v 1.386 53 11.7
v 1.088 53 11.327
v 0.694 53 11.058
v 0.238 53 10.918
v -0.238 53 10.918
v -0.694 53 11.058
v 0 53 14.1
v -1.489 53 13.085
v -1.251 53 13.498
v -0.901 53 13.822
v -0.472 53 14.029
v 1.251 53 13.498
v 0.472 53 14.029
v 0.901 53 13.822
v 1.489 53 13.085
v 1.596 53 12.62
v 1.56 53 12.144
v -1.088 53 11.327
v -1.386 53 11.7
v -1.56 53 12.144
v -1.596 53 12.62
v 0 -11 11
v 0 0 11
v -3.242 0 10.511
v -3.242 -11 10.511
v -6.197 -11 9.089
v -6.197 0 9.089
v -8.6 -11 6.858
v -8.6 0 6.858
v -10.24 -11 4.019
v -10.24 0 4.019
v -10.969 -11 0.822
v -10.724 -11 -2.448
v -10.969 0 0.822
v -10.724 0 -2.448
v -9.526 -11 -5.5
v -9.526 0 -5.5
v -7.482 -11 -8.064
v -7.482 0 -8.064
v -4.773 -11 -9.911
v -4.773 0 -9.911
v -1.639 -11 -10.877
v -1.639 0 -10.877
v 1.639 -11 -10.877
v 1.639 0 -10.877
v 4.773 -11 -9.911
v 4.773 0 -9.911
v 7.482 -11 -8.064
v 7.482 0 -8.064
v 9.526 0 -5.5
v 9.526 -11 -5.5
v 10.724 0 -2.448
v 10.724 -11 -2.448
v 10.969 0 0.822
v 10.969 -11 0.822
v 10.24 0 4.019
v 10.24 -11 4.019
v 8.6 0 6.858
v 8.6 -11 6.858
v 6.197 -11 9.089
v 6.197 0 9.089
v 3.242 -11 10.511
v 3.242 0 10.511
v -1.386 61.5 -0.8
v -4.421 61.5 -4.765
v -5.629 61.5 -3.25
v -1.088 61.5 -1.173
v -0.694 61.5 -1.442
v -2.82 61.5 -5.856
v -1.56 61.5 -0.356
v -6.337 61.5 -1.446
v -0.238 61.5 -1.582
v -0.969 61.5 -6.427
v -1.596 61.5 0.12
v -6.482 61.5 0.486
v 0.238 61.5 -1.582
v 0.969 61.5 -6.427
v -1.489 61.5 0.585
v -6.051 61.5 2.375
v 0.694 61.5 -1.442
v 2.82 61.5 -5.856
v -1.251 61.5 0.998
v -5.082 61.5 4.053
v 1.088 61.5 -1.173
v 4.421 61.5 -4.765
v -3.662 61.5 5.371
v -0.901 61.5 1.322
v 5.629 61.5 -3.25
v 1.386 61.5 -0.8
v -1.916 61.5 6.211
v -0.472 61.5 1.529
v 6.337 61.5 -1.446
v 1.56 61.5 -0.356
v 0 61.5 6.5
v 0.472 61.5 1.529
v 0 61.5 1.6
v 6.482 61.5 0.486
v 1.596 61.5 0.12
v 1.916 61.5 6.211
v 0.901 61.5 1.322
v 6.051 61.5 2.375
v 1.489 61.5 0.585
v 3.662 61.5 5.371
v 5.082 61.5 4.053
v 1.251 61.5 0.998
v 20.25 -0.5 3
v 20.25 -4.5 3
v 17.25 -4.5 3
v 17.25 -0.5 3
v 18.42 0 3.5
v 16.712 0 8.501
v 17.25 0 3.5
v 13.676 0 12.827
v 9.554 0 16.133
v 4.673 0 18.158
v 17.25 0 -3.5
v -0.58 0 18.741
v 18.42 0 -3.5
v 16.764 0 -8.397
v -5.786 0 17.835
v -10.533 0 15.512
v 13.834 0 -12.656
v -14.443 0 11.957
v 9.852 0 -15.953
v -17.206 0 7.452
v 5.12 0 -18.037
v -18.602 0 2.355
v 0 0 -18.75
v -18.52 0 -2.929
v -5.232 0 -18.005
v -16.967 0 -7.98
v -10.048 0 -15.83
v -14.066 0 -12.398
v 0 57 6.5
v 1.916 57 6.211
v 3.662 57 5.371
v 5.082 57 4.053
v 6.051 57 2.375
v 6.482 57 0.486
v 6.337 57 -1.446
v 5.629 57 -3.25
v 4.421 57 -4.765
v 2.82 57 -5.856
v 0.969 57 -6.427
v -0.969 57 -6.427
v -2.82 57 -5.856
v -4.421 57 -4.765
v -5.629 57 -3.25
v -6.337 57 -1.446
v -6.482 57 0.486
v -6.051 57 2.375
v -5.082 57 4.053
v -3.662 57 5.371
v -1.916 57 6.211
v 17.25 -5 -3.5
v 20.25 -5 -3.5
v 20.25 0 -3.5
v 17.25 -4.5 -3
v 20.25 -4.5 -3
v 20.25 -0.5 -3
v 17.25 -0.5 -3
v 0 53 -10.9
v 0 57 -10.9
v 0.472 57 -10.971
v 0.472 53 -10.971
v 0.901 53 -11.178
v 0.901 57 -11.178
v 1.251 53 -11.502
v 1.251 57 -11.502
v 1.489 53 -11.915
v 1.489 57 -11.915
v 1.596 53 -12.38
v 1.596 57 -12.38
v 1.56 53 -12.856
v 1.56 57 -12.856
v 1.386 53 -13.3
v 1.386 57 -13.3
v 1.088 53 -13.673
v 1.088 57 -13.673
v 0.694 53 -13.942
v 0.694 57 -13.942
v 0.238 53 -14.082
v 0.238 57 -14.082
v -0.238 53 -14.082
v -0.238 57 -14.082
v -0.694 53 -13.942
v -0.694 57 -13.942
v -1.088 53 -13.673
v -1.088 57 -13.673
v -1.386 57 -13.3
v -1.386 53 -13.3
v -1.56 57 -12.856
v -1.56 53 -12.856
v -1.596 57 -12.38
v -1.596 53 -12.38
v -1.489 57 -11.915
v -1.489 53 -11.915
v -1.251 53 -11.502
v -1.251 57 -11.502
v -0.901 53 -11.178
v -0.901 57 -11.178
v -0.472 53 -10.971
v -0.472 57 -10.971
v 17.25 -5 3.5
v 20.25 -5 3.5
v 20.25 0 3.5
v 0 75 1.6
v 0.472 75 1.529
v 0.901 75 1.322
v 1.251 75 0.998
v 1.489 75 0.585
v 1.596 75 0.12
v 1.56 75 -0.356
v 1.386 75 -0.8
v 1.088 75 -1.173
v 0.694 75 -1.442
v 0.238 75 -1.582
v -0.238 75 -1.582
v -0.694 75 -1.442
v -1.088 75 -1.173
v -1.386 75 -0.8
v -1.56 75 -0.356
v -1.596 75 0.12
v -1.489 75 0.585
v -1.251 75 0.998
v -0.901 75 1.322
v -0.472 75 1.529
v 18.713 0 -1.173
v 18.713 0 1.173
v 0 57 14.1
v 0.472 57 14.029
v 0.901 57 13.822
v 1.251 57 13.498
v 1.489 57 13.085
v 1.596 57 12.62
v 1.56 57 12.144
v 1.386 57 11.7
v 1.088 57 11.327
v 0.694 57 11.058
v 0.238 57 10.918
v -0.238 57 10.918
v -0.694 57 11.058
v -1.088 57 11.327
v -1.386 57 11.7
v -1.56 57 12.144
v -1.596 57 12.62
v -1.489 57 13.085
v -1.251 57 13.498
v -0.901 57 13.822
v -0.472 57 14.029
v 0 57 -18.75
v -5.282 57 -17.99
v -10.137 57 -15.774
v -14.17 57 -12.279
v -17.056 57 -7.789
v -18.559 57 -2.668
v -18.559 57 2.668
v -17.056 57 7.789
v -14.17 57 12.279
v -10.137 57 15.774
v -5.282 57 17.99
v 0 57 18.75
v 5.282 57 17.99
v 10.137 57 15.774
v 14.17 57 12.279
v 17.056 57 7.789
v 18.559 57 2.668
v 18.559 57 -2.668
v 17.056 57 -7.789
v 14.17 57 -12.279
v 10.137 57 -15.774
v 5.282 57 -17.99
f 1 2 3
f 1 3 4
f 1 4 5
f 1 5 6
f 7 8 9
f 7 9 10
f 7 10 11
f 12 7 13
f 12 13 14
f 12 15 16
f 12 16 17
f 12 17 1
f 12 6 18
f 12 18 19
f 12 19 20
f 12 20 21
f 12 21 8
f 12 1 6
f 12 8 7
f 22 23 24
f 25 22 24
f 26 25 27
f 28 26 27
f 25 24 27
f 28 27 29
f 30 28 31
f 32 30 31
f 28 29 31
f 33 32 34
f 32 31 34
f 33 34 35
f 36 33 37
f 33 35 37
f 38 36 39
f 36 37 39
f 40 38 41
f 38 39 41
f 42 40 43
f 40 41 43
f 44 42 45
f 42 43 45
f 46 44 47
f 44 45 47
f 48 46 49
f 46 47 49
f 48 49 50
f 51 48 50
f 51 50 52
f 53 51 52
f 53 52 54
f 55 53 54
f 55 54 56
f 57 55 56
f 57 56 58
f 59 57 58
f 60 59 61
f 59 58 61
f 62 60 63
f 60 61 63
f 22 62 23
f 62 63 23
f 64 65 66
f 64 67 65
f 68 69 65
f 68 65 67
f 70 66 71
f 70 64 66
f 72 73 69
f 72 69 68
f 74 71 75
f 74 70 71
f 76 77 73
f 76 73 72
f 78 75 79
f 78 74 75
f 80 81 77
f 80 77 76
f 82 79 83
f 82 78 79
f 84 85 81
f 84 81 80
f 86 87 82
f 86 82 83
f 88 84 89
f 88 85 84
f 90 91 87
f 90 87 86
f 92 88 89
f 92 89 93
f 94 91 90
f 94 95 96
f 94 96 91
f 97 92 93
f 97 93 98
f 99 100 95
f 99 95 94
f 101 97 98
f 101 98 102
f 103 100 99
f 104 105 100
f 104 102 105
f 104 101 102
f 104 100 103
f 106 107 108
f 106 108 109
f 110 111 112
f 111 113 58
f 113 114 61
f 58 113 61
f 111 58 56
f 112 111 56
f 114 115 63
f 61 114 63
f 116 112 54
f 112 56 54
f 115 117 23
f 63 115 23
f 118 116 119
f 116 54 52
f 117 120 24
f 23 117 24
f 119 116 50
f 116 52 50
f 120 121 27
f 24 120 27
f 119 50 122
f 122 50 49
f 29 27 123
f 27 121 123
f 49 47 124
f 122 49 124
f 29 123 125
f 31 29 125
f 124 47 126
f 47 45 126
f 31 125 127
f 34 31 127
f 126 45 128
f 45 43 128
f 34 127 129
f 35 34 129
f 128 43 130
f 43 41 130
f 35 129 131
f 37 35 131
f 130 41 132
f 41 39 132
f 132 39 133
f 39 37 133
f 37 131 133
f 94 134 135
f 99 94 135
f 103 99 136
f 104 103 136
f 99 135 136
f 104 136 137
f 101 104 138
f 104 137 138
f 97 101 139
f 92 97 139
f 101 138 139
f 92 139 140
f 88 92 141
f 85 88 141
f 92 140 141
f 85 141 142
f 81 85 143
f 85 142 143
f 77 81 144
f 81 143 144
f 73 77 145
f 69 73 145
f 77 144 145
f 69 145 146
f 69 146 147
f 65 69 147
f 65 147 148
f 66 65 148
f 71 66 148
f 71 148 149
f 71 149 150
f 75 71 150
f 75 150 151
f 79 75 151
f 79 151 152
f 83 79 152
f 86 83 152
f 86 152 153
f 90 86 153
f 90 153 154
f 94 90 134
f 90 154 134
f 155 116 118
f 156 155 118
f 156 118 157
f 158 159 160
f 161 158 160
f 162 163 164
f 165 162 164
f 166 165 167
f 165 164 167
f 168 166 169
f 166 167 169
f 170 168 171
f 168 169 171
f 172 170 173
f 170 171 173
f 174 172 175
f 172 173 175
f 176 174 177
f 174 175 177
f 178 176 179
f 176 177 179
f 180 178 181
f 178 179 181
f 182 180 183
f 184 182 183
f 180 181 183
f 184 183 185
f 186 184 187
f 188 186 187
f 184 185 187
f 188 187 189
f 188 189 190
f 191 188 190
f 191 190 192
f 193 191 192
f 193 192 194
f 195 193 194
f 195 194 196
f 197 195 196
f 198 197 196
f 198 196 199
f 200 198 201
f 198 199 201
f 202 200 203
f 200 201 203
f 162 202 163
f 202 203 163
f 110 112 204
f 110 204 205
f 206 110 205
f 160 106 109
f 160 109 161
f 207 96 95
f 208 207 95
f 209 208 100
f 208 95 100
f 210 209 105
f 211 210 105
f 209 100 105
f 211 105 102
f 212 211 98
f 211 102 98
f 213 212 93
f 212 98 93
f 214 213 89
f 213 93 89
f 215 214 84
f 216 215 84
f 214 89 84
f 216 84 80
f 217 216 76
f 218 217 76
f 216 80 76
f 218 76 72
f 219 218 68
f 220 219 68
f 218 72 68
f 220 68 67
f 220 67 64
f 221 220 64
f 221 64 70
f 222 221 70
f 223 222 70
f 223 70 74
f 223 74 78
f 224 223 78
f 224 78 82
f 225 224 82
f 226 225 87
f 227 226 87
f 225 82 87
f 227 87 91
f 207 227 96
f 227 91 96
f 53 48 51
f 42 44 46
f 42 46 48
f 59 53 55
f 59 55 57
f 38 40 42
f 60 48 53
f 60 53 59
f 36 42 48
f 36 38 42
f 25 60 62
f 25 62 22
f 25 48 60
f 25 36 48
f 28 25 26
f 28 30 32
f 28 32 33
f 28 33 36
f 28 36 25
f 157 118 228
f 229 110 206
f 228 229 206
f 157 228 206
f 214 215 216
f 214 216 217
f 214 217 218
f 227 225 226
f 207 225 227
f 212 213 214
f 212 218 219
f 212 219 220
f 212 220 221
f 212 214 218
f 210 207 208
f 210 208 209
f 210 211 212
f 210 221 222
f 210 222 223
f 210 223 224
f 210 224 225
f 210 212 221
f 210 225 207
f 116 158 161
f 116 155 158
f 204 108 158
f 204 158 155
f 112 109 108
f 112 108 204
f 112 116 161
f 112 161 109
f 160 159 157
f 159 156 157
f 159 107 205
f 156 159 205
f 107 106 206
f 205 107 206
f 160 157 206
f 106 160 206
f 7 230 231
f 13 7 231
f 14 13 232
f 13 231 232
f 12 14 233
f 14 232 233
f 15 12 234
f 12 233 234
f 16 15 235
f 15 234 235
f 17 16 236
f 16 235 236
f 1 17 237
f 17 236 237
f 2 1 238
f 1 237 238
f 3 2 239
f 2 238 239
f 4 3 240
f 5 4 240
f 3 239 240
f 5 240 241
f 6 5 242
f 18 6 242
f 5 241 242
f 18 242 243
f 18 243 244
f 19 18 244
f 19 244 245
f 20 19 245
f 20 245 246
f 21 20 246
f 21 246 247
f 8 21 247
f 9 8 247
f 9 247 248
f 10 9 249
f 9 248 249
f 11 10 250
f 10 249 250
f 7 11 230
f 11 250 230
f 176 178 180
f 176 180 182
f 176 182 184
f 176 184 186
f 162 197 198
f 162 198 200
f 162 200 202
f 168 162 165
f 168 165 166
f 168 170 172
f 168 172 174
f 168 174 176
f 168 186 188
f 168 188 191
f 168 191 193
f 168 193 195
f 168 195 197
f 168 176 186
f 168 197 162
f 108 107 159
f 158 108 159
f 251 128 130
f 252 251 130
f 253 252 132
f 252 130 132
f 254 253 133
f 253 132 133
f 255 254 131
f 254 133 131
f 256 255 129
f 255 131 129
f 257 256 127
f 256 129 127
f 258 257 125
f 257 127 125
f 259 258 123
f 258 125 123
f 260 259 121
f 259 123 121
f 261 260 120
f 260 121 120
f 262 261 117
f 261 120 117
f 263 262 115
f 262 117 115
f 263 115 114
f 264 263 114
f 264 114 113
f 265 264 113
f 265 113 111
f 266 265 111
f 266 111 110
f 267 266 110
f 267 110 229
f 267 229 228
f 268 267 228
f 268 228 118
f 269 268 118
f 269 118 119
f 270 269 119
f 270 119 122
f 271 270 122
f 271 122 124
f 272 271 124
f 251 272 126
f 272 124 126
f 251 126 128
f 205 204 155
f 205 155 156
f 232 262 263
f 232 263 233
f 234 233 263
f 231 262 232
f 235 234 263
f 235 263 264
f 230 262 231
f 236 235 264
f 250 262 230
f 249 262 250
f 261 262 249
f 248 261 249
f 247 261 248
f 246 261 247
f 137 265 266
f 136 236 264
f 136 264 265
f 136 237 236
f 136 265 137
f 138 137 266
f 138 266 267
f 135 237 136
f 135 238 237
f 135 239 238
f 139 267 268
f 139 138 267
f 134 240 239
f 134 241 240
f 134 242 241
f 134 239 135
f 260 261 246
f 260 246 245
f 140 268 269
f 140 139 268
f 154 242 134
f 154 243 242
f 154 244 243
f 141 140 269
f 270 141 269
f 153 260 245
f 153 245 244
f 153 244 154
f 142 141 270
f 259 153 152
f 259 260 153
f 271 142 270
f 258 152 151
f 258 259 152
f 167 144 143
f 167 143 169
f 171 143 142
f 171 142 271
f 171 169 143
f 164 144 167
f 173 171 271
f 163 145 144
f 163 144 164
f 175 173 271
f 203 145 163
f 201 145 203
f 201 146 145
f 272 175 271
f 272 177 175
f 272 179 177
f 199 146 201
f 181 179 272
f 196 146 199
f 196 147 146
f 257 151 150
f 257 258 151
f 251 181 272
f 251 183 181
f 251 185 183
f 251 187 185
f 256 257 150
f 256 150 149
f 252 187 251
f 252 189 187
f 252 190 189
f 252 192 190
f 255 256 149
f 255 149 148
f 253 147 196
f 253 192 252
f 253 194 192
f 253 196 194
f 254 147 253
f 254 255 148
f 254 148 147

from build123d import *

# Parameters (mm, degrees)
SKETCH_1_R          = 18.75
EXTRUDE_1_DEPTH     = 57
SKETCH_2_R          = 11
EXTRUDE_2_DEPTH     = 11
SKETCH_3_W          = 3
SKETCH_3_H          = 7
EXTRUDE_3_DEPTH     = 5
SKETCH_4_W          = 6
SKETCH_4_H          = 4
CUT_EXTRUDE_1_DEPTH = 3
SKETCH_5_R          = 6.5
EXTRUDE_4_DEPTH     = 4.5
SKETCH_6_R          = 1.6
CUT_EXTRUDE_2_DEPTH = 4
SKETCH_7_R          = 1.6
EXTRUDE_5_DEPTH     = 13.5


with BuildPart() as part:
    # 草图1 → 凸台-拉伸1 (new body)
    with BuildSketch(Plane(origin=(0, 0, 0), x_dir=(1, 0, 0), z_dir=(0, 1, 0))):
        with Locations(Location((0, 0, 0), (0, 0, 90))):
            Circle(SKETCH_1_R)
    extrude(amount=EXTRUDE_1_DEPTH)

    # 草图2 → 凸台-拉伸2 (add)
    with BuildSketch(Plane.XZ):
        with Locations(Location((0, 0, 0), (0, 0, 90))):
            Circle(SKETCH_2_R)
    extrude(amount=EXTRUDE_2_DEPTH)

    # 草图3 → 凸台-拉伸3 (add)
    with BuildSketch(Plane.XZ):
        with Locations((18.75, 0)):
            Rectangle(SKETCH_3_W, SKETCH_3_H)
    extrude(amount=EXTRUDE_3_DEPTH)

    # 草图4 → 切除-拉伸1 (cut)
    with BuildSketch(Plane(origin=(20.25, 0, 0), x_dir=(0, 0, -1), z_dir=(1, 0, 0))):
        with Locations((0, -2.5)):
            Rectangle(SKETCH_4_W, SKETCH_4_H)
    extrude(amount=-CUT_EXTRUDE_1_DEPTH, mode=Mode.SUBTRACT)

    # 草图5 → 凸台-拉伸4 (add)
    with BuildSketch(Plane(origin=(0, 57, 0), x_dir=(1, 0, 0), z_dir=(0, 1, 0))):
        with Locations(Location((0, 0, 0), (0, 0, 270))):
            Circle(SKETCH_5_R)
    extrude(amount=EXTRUDE_4_DEPTH)

    # 草图6 → 切除-拉伸2 (cut)
    with BuildSketch(Plane(origin=(0, 57, 0), x_dir=(1, 0, 0), z_dir=(0, 1, 0))):
        with Locations(Location((0, -12.5, 0), (0, 0, 270))):
            Circle(SKETCH_6_R)
        with Locations(Location((0, 12.5, 0), (0, 0, 270))):
            Circle(SKETCH_6_R)
    extrude(amount=-CUT_EXTRUDE_2_DEPTH, mode=Mode.SUBTRACT)

    # 草图7 → 凸台-拉伸5 (add)
    with BuildSketch(Plane(origin=(0, 61.5, 0), x_dir=(1, 0, 0), z_dir=(0, 1, 0))):
        with Locations(Location((0, 0, 0), (0, 0, 270))):
            Circle(SKETCH_7_R)
    extrude(amount=EXTRUDE_5_DEPTH)


solid = part.part
